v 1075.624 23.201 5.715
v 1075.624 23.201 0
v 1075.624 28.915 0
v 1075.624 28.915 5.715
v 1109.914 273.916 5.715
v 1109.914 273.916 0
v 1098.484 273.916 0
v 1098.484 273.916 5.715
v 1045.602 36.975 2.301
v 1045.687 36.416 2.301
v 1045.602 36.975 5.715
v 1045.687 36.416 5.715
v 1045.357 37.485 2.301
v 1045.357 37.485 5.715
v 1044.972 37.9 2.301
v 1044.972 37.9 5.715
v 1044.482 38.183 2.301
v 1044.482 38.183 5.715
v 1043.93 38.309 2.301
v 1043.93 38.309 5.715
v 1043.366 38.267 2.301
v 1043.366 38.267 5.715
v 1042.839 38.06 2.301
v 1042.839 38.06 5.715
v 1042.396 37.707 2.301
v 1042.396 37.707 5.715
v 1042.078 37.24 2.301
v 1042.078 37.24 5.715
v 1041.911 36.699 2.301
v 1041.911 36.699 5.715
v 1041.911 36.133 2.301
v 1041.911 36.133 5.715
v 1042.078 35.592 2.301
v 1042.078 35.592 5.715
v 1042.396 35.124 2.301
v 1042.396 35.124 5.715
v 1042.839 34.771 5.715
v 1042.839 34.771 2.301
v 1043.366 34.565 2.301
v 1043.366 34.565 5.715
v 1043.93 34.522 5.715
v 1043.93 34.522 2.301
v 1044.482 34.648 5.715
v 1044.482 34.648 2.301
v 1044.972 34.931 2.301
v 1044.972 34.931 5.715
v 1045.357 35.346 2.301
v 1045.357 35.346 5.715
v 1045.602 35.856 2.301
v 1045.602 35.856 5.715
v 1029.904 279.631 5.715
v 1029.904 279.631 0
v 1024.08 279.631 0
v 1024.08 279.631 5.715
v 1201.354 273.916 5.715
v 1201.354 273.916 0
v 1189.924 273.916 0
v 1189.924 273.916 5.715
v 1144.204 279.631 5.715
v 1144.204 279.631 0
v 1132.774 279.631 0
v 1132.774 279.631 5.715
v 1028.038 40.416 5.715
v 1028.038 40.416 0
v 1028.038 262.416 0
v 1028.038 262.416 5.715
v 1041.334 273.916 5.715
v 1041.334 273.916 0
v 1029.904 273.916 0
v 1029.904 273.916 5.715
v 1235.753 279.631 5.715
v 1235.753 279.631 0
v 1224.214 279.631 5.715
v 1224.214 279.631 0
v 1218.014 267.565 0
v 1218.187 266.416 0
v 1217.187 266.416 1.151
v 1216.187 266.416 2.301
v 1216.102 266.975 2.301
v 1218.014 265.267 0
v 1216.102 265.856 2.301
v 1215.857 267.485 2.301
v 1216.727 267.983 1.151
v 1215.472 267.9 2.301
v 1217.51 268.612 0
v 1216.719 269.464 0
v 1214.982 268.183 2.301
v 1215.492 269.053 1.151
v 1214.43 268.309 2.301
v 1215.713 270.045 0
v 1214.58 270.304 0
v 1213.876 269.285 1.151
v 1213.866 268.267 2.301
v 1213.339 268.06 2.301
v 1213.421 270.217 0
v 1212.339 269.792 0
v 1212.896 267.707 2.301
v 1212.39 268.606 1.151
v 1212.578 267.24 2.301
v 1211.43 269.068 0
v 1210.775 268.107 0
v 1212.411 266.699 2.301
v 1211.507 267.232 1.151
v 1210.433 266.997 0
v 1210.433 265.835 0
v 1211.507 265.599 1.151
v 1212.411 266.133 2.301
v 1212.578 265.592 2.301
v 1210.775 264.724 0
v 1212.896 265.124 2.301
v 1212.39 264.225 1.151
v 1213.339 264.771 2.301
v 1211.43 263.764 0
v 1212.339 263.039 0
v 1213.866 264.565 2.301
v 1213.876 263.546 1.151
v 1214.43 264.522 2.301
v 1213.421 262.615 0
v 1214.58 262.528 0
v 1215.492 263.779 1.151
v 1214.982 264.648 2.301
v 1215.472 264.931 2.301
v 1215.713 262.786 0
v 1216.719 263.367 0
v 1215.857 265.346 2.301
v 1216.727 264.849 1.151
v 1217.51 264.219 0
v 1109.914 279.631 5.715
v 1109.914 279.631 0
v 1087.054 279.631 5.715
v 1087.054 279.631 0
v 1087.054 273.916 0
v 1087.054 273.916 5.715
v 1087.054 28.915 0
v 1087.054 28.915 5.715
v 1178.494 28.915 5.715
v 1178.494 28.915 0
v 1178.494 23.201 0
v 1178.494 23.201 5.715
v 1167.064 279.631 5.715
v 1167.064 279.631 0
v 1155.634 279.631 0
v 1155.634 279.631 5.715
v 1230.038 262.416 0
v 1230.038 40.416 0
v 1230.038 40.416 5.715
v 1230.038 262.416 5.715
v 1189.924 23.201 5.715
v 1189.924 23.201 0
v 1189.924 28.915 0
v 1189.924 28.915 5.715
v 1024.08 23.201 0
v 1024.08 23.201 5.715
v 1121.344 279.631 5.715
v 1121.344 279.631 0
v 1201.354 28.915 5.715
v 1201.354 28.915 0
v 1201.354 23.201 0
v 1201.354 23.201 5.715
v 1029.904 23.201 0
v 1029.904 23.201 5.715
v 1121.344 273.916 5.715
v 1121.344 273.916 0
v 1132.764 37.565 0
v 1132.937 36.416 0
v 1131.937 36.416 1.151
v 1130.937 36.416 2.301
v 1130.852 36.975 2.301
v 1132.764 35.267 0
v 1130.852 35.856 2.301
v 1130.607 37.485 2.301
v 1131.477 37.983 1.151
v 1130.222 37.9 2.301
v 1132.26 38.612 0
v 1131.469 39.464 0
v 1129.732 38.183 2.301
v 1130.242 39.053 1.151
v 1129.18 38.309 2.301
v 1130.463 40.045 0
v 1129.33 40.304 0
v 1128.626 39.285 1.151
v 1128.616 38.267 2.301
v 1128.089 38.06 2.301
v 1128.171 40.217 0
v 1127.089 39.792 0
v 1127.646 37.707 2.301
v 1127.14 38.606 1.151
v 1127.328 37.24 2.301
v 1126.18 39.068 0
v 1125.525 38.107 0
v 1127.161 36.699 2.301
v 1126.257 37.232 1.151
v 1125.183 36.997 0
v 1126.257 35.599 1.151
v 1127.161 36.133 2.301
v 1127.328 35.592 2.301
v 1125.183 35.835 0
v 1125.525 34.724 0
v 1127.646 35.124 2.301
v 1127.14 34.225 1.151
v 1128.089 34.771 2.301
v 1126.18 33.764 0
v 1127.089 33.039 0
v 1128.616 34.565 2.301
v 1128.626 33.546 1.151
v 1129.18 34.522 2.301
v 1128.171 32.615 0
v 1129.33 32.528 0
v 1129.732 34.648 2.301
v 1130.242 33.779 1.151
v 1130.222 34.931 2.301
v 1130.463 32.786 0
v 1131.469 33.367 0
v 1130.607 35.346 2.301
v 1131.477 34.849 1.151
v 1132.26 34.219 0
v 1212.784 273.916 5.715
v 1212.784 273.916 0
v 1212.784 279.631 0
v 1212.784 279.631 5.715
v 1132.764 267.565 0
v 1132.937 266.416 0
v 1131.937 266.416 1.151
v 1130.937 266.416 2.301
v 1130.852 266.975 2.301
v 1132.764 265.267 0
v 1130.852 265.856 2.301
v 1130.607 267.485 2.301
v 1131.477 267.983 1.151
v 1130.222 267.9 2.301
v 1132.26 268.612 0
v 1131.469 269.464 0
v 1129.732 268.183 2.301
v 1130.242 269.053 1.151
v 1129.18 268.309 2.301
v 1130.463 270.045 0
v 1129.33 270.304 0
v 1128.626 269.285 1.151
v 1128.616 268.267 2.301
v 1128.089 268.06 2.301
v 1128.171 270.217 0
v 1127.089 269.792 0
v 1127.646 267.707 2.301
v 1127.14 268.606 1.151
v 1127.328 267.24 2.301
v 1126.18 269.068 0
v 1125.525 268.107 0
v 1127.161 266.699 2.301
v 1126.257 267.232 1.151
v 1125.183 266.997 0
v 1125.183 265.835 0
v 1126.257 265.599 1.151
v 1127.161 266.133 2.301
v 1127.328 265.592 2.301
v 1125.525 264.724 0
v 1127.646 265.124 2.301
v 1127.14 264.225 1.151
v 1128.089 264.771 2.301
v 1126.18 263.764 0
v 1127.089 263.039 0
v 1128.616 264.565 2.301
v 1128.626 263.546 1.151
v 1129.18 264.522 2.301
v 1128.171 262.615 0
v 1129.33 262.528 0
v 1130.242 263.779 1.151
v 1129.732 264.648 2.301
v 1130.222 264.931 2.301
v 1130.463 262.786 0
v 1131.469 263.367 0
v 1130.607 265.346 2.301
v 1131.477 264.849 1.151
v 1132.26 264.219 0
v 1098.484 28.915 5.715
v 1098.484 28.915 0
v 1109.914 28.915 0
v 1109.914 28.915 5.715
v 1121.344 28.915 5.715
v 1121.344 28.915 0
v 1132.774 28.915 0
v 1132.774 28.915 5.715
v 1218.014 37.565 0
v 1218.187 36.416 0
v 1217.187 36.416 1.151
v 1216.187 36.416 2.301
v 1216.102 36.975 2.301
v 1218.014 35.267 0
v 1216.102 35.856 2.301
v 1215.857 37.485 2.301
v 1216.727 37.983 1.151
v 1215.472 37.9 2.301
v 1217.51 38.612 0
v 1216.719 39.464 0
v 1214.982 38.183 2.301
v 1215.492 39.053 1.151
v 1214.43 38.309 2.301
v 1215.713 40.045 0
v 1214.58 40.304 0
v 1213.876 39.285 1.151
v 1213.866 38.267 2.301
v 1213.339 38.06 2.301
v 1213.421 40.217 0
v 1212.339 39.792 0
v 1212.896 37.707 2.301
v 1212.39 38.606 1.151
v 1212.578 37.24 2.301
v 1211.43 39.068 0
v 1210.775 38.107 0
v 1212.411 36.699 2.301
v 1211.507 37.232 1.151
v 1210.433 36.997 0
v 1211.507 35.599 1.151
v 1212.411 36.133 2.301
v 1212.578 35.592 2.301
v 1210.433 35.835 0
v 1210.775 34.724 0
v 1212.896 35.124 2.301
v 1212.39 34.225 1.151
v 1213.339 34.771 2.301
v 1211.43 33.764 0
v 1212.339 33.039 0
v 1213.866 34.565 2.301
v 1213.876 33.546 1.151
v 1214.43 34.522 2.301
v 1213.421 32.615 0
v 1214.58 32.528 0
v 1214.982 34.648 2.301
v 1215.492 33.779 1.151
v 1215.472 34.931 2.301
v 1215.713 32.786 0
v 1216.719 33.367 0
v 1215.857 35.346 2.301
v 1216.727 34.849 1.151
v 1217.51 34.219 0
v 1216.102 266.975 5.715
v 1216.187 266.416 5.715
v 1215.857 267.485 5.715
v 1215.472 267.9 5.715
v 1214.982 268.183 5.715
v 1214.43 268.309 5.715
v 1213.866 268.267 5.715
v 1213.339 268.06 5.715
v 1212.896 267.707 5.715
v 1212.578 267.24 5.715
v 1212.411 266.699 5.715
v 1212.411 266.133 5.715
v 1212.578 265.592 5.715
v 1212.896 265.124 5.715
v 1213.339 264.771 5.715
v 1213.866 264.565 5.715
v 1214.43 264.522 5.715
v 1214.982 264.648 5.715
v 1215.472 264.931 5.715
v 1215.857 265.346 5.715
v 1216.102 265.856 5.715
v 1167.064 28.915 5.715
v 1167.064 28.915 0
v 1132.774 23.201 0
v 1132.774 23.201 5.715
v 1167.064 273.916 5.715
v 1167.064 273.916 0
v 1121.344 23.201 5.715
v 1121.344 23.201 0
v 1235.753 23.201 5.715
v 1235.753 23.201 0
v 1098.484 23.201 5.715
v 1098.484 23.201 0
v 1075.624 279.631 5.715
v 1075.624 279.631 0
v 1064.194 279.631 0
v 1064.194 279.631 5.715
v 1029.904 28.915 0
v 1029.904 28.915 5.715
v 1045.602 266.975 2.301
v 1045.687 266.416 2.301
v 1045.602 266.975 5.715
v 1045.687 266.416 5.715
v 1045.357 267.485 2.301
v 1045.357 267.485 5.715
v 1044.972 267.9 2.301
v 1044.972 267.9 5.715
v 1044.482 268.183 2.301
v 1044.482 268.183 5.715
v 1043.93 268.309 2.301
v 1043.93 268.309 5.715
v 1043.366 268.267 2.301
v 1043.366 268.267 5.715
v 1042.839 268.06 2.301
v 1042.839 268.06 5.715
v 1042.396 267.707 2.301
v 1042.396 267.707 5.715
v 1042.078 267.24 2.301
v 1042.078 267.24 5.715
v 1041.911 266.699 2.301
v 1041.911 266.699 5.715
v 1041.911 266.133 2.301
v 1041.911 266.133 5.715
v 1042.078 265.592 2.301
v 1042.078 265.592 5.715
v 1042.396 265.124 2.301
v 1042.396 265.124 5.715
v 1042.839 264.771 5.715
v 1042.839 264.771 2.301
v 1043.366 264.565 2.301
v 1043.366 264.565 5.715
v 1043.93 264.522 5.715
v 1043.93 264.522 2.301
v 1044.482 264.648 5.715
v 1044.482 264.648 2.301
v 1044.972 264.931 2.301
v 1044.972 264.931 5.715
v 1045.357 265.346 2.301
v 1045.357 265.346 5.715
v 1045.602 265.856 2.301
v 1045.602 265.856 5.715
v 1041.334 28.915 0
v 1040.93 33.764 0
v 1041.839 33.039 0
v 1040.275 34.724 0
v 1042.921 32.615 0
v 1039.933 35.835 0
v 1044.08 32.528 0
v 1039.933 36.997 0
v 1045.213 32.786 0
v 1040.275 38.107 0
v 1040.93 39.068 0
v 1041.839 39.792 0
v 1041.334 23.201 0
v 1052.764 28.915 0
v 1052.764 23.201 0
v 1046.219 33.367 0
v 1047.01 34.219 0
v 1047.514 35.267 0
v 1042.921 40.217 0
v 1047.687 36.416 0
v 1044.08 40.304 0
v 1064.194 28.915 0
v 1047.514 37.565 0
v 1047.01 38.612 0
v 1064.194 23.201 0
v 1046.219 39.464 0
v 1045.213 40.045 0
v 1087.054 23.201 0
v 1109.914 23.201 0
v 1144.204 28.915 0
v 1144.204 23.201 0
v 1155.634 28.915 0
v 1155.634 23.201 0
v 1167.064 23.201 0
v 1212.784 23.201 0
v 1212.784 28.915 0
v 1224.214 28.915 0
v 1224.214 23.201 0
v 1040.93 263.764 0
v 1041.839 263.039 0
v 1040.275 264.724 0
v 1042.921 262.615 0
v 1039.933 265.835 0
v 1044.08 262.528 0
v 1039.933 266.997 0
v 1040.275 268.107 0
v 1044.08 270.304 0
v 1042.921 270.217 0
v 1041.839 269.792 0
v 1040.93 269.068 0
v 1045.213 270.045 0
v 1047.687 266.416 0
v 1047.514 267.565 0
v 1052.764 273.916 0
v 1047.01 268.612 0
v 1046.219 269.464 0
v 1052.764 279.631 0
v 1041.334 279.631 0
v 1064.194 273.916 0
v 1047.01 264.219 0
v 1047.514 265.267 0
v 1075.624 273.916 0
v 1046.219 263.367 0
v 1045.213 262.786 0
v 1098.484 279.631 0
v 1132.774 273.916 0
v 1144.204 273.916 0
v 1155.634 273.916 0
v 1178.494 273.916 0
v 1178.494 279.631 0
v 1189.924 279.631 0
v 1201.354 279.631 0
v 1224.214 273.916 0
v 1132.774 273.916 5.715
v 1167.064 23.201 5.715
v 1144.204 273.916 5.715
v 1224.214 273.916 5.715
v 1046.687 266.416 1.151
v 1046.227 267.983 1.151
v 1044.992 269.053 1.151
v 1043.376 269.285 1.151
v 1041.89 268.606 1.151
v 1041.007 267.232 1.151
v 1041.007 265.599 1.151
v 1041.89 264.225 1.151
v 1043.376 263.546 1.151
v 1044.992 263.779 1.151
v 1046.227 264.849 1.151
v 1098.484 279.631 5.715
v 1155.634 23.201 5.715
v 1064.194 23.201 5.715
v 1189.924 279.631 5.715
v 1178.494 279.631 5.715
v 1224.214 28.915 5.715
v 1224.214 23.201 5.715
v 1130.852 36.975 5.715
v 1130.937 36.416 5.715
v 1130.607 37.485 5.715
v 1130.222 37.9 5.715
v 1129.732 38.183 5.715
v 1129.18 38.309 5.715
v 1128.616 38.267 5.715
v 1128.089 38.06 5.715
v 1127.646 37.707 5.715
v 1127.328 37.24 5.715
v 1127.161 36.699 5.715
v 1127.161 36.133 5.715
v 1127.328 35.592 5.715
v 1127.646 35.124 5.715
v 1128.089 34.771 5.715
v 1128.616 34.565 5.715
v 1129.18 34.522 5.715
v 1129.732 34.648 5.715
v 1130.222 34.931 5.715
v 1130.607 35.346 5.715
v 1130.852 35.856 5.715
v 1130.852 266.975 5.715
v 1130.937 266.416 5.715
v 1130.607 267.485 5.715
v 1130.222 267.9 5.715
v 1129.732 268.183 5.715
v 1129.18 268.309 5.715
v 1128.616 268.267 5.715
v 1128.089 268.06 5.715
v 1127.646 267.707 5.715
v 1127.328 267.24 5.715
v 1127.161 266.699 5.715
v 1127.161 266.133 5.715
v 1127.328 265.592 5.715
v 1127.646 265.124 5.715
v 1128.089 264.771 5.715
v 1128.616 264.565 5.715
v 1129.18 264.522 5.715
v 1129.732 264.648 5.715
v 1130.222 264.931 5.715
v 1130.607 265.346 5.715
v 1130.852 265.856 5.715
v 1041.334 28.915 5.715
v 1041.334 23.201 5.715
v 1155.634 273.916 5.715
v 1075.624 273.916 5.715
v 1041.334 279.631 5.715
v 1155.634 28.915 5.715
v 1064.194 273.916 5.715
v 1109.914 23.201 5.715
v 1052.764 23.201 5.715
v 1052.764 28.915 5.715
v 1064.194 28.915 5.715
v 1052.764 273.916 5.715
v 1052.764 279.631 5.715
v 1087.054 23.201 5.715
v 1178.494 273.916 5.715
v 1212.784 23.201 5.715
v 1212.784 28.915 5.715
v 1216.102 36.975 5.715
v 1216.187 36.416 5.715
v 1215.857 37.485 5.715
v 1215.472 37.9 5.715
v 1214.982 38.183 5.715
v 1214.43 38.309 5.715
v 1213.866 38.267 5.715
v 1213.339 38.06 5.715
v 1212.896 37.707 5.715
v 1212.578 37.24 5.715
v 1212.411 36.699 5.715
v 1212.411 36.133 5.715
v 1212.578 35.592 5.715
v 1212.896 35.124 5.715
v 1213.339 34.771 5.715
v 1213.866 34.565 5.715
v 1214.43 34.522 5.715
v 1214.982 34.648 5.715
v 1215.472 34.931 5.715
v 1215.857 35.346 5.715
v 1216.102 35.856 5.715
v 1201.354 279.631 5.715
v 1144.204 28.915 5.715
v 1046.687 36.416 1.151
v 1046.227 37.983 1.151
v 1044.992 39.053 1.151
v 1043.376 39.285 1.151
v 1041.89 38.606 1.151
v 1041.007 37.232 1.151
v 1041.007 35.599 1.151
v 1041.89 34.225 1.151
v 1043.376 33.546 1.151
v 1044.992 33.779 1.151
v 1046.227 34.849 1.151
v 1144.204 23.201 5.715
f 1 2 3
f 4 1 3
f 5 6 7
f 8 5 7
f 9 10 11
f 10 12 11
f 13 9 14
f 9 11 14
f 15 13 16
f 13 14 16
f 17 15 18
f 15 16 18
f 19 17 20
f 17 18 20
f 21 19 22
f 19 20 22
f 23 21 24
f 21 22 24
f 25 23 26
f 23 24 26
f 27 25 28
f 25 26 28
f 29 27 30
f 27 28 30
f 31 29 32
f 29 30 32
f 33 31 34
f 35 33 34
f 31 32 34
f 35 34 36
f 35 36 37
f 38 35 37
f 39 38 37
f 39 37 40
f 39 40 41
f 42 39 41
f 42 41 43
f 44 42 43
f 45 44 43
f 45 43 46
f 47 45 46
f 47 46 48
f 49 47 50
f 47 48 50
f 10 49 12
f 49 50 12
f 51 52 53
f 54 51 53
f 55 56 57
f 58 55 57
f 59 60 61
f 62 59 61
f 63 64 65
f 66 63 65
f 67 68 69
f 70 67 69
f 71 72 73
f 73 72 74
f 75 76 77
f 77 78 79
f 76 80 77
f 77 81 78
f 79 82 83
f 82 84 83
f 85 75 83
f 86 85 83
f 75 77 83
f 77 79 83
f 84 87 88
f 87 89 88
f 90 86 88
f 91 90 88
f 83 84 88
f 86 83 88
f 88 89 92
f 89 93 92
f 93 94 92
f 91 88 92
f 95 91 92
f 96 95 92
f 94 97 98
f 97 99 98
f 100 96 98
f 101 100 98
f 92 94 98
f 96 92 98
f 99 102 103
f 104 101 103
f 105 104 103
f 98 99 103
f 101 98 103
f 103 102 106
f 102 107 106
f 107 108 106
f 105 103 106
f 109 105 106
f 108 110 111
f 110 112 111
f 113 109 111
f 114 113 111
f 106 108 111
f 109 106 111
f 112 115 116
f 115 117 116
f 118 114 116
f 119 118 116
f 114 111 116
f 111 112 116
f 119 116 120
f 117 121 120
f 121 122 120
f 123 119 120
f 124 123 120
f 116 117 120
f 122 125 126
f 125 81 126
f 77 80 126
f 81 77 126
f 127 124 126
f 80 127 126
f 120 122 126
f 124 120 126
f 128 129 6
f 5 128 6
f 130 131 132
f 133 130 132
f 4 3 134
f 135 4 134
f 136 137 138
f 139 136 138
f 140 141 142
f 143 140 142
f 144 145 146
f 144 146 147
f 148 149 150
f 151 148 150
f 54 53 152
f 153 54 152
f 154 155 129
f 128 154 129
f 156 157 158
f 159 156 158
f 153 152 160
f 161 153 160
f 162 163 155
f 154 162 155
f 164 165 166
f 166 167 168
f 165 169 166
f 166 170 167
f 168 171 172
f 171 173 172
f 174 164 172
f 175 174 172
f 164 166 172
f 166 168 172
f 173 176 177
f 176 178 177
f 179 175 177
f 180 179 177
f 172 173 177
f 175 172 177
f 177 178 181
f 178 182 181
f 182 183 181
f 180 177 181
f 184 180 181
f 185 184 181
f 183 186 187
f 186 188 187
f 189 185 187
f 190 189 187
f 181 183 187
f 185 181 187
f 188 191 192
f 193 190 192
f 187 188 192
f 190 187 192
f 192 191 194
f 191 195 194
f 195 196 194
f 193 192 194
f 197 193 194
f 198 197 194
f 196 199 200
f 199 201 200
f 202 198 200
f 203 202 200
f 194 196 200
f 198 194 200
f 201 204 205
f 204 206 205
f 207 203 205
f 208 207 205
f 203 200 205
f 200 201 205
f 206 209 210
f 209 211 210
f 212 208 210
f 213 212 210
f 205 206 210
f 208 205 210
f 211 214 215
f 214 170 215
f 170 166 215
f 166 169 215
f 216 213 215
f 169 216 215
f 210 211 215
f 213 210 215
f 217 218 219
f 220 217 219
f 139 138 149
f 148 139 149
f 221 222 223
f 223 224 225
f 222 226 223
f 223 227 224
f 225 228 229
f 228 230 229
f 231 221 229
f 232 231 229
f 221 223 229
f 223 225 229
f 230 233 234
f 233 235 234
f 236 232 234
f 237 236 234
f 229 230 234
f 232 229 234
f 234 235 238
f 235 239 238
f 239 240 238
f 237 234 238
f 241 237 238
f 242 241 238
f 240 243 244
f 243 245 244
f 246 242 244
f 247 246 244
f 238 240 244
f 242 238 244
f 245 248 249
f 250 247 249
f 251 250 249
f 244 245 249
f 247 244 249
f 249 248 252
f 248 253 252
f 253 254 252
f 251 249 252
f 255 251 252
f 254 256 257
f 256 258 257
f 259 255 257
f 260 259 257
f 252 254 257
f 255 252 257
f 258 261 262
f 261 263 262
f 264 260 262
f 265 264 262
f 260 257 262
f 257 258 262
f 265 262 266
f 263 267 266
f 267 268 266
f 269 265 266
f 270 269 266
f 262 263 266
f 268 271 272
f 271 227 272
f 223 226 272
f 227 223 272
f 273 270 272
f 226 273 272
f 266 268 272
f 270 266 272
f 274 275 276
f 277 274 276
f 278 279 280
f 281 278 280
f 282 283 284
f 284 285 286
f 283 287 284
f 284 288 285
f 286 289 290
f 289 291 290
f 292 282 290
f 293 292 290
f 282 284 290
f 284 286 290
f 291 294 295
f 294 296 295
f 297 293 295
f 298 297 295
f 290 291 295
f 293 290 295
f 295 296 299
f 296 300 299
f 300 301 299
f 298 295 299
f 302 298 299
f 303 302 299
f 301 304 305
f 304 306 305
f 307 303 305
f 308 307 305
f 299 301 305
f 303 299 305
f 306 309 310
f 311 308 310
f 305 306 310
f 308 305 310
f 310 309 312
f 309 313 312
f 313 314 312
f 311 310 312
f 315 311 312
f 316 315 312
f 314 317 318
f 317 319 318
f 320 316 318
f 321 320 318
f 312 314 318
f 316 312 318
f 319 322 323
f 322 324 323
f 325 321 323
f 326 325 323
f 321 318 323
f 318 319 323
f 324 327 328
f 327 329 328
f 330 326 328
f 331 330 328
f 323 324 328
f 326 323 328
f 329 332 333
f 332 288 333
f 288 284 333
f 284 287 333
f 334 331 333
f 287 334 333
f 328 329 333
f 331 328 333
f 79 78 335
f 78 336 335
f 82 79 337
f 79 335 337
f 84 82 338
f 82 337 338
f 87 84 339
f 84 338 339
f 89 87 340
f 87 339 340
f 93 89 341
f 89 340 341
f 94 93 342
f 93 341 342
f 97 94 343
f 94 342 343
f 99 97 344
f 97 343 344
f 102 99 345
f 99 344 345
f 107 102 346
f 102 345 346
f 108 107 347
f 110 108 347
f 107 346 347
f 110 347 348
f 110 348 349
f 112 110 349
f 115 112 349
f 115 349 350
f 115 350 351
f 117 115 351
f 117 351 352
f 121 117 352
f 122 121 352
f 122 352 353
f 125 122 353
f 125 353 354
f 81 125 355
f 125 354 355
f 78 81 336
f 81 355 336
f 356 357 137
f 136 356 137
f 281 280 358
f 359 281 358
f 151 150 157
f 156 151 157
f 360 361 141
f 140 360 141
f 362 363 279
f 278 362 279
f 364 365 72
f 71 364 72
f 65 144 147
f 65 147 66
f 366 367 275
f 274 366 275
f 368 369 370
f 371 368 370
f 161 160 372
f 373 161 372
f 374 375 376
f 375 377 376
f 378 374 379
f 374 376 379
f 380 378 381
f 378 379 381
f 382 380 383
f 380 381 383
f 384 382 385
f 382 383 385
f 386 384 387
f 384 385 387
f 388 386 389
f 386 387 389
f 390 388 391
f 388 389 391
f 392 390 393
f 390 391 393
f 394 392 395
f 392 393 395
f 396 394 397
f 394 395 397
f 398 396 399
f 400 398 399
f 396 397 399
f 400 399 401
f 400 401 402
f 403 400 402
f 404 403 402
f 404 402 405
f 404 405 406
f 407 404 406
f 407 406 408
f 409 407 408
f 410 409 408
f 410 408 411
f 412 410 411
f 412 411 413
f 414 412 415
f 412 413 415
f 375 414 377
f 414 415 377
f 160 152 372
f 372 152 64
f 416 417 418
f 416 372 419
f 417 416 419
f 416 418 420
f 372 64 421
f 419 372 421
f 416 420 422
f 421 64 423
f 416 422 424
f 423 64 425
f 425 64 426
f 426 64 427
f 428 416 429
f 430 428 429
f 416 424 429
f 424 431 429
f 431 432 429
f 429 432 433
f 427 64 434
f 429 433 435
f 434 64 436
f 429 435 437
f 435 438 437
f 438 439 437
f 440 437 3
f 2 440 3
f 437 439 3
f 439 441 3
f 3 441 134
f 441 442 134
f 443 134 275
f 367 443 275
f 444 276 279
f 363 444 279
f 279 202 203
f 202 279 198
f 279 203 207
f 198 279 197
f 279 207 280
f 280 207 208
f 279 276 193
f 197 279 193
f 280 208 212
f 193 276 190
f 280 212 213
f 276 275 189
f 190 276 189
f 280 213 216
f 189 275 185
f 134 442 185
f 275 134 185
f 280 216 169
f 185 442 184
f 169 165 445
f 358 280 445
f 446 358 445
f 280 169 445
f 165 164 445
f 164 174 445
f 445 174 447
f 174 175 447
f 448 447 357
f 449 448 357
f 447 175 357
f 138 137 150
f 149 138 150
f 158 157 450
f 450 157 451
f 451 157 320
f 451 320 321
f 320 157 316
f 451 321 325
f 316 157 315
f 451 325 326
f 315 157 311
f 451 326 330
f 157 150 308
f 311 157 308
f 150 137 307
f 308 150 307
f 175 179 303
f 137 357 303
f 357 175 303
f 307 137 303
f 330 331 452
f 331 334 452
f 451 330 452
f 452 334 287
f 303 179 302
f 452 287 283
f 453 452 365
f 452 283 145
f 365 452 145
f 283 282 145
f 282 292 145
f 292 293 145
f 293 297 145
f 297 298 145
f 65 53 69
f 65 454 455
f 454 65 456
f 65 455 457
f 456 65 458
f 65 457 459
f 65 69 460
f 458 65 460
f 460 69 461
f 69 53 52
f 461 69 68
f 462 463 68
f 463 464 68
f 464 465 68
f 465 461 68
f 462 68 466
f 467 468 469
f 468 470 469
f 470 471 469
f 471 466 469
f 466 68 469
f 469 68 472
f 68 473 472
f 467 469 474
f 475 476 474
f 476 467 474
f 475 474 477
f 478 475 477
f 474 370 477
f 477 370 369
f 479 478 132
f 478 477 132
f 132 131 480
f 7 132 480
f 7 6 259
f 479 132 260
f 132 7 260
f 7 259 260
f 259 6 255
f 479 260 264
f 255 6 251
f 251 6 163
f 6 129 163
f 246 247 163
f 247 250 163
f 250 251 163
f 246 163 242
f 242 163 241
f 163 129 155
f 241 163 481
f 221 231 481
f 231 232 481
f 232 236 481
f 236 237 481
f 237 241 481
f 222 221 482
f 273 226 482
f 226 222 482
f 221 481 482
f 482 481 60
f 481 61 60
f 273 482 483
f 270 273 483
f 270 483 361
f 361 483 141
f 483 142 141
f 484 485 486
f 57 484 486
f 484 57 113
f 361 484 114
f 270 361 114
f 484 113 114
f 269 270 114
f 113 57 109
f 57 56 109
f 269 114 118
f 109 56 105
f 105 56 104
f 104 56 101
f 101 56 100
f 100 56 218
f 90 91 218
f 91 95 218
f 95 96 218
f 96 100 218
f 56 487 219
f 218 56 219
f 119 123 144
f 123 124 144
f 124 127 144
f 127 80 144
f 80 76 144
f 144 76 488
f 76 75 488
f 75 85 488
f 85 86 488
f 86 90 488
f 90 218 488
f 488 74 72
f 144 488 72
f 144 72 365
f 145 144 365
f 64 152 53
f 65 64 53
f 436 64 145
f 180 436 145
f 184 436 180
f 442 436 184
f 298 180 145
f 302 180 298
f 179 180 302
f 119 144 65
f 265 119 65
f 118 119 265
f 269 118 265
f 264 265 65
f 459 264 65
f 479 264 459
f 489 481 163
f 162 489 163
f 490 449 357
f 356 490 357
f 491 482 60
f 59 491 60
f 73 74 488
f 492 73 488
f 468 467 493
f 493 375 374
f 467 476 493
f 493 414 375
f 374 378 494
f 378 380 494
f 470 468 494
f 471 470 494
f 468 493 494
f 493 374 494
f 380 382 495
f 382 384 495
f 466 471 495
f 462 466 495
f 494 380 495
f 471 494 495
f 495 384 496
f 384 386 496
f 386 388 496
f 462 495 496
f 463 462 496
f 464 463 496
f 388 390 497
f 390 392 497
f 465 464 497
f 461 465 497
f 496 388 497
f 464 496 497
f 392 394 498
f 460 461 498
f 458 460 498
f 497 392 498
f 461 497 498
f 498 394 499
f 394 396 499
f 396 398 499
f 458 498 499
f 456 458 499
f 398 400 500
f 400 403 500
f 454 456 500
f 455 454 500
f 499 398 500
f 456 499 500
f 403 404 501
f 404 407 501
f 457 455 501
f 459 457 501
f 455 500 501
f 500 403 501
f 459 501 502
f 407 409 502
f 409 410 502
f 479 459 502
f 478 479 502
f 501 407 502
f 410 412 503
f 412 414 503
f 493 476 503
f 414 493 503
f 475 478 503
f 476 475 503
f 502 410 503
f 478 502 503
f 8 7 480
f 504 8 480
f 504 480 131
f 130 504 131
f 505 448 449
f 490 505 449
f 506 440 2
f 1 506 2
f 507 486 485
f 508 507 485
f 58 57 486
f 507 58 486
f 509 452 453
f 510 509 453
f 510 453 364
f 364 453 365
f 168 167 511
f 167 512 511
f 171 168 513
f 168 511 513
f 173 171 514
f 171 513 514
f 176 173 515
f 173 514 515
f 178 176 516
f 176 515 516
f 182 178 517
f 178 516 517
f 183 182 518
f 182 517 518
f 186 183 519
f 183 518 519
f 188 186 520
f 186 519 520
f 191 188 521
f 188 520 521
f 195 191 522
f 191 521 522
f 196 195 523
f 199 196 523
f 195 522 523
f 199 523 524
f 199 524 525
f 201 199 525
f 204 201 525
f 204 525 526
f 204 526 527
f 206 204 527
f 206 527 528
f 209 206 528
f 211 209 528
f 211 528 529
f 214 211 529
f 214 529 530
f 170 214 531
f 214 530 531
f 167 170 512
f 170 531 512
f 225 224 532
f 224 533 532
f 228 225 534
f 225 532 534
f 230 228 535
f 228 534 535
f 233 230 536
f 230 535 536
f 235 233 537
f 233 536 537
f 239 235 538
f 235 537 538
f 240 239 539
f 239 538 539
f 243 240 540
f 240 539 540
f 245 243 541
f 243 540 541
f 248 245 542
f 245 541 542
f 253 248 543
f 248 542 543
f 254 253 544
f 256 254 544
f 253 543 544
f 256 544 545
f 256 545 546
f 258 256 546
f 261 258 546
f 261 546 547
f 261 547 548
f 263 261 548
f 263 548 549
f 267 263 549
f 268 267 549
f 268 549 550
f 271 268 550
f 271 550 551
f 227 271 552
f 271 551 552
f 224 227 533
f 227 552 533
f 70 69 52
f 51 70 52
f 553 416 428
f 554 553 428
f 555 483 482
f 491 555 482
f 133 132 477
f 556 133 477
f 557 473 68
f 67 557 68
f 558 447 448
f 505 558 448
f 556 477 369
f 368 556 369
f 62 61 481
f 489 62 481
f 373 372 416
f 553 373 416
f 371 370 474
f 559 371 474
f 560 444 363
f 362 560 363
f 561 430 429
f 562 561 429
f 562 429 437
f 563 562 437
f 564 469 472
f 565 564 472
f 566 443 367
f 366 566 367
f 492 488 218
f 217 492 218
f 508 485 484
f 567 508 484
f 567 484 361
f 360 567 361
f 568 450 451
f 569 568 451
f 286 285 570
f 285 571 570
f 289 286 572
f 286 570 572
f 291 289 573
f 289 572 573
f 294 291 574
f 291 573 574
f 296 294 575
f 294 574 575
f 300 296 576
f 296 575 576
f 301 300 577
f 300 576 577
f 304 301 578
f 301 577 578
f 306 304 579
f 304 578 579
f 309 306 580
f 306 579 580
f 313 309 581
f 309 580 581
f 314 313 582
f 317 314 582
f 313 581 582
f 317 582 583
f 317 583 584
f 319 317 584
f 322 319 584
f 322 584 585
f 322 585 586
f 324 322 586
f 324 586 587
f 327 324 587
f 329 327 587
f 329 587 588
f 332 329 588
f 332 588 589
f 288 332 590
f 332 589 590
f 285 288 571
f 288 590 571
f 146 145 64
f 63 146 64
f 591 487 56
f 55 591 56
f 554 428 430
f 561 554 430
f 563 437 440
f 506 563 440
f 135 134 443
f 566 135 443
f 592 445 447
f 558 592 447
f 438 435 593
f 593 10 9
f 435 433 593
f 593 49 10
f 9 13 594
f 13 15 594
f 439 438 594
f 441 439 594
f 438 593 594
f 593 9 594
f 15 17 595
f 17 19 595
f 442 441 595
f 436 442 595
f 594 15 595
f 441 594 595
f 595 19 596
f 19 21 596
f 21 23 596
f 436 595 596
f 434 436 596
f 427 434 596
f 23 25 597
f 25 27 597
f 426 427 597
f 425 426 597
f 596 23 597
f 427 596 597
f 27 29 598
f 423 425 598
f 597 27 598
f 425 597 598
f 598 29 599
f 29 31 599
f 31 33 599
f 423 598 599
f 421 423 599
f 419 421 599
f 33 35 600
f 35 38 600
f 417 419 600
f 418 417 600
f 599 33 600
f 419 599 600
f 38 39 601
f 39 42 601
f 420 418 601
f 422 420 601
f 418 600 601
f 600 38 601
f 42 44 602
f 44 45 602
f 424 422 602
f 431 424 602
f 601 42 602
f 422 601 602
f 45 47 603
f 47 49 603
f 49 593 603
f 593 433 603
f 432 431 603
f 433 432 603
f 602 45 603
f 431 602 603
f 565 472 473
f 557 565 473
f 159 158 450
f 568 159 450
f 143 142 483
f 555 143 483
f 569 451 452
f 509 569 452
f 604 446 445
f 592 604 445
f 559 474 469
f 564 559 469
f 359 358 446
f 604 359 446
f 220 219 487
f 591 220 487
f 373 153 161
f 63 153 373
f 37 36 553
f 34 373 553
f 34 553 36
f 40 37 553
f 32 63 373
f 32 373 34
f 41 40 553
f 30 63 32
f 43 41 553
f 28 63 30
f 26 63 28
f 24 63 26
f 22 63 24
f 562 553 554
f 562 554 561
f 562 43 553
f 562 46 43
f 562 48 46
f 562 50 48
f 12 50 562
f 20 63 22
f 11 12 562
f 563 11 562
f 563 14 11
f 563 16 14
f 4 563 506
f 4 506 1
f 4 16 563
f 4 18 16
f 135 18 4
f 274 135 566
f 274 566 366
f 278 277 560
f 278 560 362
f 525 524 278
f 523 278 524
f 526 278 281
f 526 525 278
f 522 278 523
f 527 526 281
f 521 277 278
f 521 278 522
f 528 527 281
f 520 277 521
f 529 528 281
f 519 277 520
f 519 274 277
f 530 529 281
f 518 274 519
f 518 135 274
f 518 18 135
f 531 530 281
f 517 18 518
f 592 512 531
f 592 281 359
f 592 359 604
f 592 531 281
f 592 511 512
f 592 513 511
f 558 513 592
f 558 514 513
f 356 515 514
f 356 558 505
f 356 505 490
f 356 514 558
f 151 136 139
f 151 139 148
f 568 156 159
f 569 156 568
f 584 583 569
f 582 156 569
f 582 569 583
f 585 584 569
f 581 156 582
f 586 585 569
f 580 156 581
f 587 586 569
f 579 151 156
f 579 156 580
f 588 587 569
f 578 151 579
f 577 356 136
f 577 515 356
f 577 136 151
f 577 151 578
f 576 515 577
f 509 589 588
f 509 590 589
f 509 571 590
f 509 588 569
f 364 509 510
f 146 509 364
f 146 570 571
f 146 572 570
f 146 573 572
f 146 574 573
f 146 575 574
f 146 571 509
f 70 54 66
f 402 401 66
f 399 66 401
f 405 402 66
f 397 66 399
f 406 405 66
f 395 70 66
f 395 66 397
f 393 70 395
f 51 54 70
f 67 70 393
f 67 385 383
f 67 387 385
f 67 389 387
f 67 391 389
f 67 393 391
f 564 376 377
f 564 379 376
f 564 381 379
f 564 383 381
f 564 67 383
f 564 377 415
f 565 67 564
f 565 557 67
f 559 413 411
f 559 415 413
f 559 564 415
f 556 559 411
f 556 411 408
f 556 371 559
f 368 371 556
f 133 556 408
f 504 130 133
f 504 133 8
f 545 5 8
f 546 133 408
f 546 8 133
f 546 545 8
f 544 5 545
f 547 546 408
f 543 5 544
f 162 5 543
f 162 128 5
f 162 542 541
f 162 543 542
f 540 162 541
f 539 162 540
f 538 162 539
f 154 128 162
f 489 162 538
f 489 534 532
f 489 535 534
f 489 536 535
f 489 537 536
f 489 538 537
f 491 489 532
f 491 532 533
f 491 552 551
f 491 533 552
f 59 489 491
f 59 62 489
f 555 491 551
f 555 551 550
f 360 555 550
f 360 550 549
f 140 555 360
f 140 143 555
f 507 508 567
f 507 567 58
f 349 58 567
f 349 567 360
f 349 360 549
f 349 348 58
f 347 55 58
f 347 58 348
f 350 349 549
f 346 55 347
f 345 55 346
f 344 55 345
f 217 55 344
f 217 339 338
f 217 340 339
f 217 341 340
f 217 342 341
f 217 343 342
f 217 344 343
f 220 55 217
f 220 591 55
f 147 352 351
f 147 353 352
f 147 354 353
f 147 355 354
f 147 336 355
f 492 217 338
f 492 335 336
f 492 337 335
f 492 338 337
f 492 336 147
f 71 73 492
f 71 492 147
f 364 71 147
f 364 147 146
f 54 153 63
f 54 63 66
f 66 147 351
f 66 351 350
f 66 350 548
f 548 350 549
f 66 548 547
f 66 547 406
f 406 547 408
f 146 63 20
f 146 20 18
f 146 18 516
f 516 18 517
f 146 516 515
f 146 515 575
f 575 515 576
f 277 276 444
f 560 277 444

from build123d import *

# Parameters (mm, degrees)
BOSS_EXTRUDE1_DEPTH                               = 5.715
SKETCH1_W                                         = 202
SKETCH1_H                                         = 222
CUT_EXTRUDE1_DEPTH                                = 6.715
CSK_FOR_6_FLAT_HEAD_SOCKET_CAP_SCREW1_D           = 3.7973
CSK_FOR_6_FLAT_HEAD_SOCKET_CAP_SCREW1_DEPTH       = 20
CSK_FOR_6_FLAT_HEAD_SOCKET_CAP_SCREW1_CSINK_D     = 7.7978
CSK_FOR_6_FLAT_HEAD_SOCKET_CAP_SCREW1_CSINK_ANGLE = 82
CSK_FOR_6_FLAT_HEAD_SOCKET_CAP_SCREW1_TIP         = 1.140824014


with BuildPart() as part:
    # Model → Boss-Extrude1 (new body)
    with BuildSketch(Plane.XY):
        Polygon((1024.07974, 23.2006394), (1029.90396, 23.2006394), (1029.90396, 28.91536), (1041.33396, 28.91536), (1041.33396, 23.2006394), (1052.76396, 23.2006394), (1052.76396, 28.91536), (1064.19396, 28.91536), (1064.19396, 23.2006394), (1075.62396, 23.2006394), (1075.62396, 28.91536), (1087.05396, 28.91536), (1087.05396, 23.2006394), (1098.48396, 23.2006394), (1098.48396, 28.91536), (1109.91396, 28.91536), (1109.91396, 23.2006394), (1121.34396, 23.2006394), (1121.34396, 28.91536), (1132.77396, 28.91536), (1132.77396, 23.2006394), (1144.20396, 23.2006394), (1144.20396, 28.91536), (1155.63396, 28.91536), (1155.63396, 23.2006394), (1167.06396, 23.2006394), (1167.06396, 28.91536), (1178.49396, 28.91536), (1178.49396, 23.2006394), (1189.92396, 23.2006394), (1189.92396, 28.91536), (1201.35396, 28.91536), (1201.35396, 23.2006394), (1212.78396, 23.2006394), (1212.78396, 28.91536), (1224.21396, 28.91536), (1224.21396, 23.2006394), (1235.75318, 23.2006394), (1235.75318, 279.63114), (1224.21396, 279.63114), (1224.21396, 273.91614), (1212.78396, 273.91614), (1212.78396, 279.63114), (1201.35396, 279.63114), (1201.35396, 273.91614), (1189.92396, 273.91614), (1189.92396, 279.63114), (1178.49396, 279.63114), (1178.49396, 273.91614), (1167.06396, 273.91614), (1167.06396, 279.63114), (1155.63396, 279.63114), (1155.63396, 273.91614), (1144.20396, 273.91614), (1144.20396, 279.63114), (1132.77396, 279.63114), (1132.77396, 273.91614), (1121.34396, 273.91614), (1121.34396, 279.63114), (1109.91396, 279.63114), (1109.91396, 273.91614), (1098.48396, 273.91614), (1098.48396, 279.63114), (1087.05396, 279.63114), (1087.05396, 273.91614), (1075.62396, 273.91614), (1075.62396, 279.63114), (1064.19396, 279.63114), (1064.19396, 273.91614), (1052.76396, 273.91614), (1052.76396, 279.63114), (1041.33396, 279.63114), (1041.33396, 273.91614), (1029.90396, 273.91614), (1029.90396, 279.63114), (1024.07974, 279.63114), align=None)
    extrude(amount=BOSS_EXTRUDE1_DEPTH)

    # Sketch1 → Cut-Extrude1 (cut, through all)
    with BuildSketch(Plane(origin=(0, 0, 0), x_dir=(-1, 0, 0), z_dir=(0, 0, -1))):
        with Locations((-1129.03818, 151.41575)):
            Rectangle(SKETCH1_W, SKETCH1_H)
    extrude(amount=-CUT_EXTRUDE1_DEPTH, mode=Mode.SUBTRACT)

    # CSK for #6 Flat Head Socket Cap Screw1
    with Locations(Plane(origin=(1095.03845, 151.41575, 0), x_dir=(-1, 0, 0), z_dir=(0, 0, -1))):
        with Locations((-119.24973, 115), (-33.99973, 115), (51.25027, 115), (51.25027, -115), (-33.99973, -115), (-119.24973, -115)):
            CounterSinkHole(CSK_FOR_6_FLAT_HEAD_SOCKET_CAP_SCREW1_D / 2, CSK_FOR_6_FLAT_HEAD_SOCKET_CAP_SCREW1_CSINK_D / 2, depth=CSK_FOR_6_FLAT_HEAD_SOCKET_CAP_SCREW1_DEPTH, counter_sink_angle=CSK_FOR_6_FLAT_HEAD_SOCKET_CAP_SCREW1_CSINK_ANGLE)
            with Locations((0, 0, -(CSK_FOR_6_FLAT_HEAD_SOCKET_CAP_SCREW1_DEPTH + CSK_FOR_6_FLAT_HEAD_SOCKET_CAP_SCREW1_TIP / 2))):  # 118° drill point
                Cone(0, CSK_FOR_6_FLAT_HEAD_SOCKET_CAP_SCREW1_D / 2, CSK_FOR_6_FLAT_HEAD_SOCKET_CAP_SCREW1_TIP, mode=Mode.SUBTRACT)


solid = part.part
